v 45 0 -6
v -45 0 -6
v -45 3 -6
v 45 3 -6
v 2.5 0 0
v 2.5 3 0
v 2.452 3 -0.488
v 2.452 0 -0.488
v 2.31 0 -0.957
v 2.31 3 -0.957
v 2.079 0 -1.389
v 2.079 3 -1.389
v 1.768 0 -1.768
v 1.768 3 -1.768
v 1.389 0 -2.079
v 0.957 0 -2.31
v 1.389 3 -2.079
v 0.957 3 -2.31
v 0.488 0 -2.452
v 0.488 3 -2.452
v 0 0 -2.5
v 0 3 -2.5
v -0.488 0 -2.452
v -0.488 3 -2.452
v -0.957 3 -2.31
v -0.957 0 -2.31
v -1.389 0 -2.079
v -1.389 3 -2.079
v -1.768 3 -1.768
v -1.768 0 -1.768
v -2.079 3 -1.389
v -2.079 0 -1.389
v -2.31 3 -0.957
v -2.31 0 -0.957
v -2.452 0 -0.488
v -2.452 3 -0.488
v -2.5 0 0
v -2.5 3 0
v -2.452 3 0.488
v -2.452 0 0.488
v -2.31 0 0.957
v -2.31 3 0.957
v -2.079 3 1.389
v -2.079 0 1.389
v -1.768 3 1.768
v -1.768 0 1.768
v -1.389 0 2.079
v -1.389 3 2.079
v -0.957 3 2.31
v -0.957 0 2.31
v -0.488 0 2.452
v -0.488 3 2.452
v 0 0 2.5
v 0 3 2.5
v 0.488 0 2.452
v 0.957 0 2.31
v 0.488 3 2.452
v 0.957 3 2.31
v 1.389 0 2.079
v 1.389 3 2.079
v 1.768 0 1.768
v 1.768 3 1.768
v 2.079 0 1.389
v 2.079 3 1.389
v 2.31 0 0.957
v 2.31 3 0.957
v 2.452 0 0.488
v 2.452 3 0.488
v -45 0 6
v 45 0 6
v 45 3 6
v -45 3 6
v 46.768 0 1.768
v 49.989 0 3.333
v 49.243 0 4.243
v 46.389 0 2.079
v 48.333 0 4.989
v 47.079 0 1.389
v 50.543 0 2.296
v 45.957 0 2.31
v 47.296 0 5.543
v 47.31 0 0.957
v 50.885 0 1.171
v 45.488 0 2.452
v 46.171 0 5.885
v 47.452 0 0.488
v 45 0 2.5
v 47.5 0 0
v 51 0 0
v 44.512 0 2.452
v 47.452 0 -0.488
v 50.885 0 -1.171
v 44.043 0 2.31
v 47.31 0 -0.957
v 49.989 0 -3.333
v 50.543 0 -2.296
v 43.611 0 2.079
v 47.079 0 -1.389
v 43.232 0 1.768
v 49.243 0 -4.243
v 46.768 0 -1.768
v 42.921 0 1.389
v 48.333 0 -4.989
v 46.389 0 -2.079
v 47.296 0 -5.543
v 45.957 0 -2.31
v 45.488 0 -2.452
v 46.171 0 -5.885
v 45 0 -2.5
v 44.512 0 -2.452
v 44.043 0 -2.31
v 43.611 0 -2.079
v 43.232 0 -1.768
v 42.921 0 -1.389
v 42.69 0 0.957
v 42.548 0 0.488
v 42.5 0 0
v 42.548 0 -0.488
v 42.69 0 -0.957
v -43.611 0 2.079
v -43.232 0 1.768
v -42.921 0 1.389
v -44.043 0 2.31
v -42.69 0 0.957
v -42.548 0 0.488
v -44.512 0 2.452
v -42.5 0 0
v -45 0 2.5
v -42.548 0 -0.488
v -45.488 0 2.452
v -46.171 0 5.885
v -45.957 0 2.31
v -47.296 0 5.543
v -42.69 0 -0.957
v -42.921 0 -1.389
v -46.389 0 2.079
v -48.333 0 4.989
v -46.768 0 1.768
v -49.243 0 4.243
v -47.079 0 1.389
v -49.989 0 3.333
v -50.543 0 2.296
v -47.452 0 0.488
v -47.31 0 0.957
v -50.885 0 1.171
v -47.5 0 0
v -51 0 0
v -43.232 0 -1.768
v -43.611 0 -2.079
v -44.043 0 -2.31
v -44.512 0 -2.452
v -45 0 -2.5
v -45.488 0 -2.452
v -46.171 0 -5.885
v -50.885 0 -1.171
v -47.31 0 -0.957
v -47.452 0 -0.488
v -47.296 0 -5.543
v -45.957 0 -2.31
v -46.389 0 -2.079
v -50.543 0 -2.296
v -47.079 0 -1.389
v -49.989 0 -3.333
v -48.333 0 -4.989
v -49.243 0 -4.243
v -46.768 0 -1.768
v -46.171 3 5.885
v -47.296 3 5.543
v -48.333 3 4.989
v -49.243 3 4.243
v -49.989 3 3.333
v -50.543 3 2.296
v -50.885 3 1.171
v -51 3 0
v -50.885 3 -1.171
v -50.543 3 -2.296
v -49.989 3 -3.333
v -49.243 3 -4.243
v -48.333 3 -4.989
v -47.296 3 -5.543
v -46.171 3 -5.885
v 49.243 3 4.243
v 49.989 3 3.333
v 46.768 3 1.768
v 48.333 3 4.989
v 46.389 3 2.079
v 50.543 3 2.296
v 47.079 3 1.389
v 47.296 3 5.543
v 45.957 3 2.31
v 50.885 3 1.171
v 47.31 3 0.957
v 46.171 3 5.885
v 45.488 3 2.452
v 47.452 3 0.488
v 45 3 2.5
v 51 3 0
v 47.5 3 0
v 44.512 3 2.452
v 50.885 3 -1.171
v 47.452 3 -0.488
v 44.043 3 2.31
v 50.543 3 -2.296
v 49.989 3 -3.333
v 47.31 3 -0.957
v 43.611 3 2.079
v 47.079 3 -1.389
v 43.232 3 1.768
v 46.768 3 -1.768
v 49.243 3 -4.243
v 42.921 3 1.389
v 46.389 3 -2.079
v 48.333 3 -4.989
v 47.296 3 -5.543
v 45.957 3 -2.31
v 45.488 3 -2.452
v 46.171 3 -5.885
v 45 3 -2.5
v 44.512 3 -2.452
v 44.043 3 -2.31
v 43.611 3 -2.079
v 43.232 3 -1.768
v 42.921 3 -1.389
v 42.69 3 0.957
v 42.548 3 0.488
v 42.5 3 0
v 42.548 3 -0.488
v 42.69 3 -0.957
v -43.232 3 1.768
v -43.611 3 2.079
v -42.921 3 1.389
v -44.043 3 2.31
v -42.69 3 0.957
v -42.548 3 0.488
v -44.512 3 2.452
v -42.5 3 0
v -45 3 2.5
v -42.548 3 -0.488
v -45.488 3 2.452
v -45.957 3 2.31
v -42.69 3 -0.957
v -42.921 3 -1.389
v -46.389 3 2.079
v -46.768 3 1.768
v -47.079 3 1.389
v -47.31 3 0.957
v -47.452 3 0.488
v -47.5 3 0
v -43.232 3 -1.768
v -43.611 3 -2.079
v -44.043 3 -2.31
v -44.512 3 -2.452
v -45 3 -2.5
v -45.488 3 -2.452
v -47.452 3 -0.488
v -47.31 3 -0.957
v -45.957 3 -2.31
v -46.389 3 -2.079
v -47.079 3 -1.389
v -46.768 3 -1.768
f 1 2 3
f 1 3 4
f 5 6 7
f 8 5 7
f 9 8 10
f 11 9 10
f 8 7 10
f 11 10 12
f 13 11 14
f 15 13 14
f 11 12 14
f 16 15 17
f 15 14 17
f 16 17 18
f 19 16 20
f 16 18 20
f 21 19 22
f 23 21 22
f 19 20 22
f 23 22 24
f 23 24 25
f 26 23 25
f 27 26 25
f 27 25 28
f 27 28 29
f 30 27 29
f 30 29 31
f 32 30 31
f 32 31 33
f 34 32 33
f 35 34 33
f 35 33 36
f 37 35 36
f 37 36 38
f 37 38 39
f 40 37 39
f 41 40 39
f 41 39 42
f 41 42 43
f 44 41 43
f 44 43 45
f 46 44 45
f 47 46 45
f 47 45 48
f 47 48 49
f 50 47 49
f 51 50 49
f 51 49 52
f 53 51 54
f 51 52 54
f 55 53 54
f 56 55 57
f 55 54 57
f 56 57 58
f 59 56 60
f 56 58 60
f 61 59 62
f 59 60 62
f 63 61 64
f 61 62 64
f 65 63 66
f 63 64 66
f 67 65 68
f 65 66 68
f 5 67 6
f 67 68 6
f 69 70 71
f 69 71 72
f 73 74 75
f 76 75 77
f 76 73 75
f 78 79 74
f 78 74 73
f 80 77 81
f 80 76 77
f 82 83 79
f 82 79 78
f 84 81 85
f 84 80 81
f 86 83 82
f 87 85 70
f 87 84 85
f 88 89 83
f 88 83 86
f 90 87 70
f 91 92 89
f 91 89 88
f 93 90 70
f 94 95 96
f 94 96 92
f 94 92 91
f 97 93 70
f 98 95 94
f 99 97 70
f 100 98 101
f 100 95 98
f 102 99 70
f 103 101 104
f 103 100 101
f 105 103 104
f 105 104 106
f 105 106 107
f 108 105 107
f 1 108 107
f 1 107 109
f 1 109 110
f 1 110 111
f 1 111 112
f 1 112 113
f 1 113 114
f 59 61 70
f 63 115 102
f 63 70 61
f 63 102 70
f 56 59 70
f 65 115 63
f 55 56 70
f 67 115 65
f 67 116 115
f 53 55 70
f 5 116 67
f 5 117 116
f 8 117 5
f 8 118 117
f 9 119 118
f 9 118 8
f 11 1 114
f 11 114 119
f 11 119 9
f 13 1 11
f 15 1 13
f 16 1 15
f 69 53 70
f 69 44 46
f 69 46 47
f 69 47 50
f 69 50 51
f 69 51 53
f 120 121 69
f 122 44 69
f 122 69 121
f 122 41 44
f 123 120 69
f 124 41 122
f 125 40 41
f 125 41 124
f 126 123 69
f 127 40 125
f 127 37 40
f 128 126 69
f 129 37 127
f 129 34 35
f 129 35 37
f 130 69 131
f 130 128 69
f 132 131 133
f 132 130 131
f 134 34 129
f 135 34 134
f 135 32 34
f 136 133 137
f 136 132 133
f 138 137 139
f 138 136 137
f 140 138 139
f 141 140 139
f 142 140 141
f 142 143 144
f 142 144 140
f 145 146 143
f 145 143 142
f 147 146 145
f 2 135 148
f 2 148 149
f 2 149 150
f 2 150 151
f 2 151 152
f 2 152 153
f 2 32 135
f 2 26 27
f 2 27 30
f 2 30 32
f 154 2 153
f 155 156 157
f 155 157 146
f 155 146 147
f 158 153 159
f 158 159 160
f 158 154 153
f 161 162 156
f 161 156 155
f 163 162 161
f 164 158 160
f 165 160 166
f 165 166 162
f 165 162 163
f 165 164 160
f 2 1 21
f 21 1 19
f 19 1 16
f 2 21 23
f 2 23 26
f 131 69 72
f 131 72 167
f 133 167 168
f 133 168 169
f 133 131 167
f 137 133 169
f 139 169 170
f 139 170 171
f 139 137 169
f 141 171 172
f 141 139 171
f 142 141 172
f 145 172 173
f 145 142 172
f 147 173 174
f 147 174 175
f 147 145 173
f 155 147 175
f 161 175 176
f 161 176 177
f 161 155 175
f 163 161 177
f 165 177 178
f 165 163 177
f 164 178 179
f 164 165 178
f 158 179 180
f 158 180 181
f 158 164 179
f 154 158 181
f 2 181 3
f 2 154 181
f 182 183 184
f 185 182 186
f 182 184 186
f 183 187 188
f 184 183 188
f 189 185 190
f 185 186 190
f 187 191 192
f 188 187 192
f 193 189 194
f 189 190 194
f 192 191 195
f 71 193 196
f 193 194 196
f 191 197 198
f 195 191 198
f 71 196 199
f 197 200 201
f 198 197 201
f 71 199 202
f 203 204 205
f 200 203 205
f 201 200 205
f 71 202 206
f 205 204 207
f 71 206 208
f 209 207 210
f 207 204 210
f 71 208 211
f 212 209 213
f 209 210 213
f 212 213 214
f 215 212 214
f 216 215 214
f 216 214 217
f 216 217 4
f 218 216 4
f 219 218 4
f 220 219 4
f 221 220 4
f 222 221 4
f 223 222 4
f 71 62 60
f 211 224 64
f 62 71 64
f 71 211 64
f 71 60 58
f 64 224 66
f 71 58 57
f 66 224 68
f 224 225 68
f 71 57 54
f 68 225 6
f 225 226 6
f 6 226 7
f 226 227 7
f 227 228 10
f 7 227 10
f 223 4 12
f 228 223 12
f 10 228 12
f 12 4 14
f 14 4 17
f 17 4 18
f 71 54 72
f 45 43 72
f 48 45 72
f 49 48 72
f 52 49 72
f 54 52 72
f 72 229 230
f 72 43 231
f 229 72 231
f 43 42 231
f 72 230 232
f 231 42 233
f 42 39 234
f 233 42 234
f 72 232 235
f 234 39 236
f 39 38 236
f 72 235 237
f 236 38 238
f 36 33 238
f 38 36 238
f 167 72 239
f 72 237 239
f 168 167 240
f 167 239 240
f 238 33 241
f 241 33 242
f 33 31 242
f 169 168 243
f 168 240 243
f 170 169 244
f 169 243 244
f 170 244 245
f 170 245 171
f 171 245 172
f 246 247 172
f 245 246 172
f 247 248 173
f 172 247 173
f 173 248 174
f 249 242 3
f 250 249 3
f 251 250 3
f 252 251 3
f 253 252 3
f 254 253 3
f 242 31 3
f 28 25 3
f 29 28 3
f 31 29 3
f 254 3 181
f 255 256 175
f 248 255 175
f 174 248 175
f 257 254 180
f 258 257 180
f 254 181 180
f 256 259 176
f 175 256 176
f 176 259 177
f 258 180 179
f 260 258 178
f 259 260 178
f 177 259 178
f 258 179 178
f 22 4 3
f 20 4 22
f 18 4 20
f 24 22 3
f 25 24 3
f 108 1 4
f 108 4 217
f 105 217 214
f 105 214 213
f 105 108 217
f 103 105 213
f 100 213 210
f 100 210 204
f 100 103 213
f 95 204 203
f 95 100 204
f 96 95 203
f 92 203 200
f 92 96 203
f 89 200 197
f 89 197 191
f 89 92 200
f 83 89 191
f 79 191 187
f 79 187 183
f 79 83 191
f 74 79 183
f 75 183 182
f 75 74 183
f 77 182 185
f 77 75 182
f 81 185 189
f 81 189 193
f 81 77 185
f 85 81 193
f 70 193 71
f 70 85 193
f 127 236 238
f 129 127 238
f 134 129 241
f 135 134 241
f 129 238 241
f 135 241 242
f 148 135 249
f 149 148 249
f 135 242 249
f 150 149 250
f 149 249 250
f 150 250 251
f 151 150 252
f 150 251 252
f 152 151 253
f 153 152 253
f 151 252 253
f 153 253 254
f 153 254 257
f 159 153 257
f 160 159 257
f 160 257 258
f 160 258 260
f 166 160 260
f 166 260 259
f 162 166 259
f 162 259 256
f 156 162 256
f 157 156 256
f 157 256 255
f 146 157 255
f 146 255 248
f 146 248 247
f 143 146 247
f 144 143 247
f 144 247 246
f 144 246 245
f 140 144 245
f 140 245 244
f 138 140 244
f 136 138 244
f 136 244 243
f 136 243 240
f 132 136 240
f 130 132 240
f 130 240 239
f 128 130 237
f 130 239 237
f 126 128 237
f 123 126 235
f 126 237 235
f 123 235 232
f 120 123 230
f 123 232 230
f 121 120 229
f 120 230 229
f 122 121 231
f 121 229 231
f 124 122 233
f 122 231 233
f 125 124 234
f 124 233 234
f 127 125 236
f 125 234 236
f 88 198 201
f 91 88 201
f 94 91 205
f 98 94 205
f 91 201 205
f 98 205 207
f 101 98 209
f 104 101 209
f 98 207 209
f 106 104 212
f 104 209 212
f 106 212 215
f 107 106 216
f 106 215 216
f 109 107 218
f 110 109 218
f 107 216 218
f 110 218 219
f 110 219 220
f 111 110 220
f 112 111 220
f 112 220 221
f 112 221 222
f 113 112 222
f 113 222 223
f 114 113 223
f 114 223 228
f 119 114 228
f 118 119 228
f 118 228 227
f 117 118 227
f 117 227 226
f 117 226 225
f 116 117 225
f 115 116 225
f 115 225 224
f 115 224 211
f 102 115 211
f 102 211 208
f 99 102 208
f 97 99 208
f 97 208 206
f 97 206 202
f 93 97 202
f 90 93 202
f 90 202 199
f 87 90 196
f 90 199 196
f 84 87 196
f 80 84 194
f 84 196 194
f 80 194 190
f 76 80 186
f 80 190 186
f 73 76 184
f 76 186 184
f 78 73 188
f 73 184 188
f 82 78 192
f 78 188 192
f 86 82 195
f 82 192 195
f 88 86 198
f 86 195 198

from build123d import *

# Parameters (mm, degrees)
EXTRUDE_1_DEPTH     = 3
CUT_EXTRUDE_1_REACH = 5
SKETCH_2_R          = 2.5


with BuildPart() as part:
    # 草圖1 → 填料-伸長1 (new body)
    with BuildSketch(Plane(origin=(0, 0, 0), x_dir=(1, 0, 0), z_dir=(0, 1, 0))):
        with BuildLine():
            Line((-45, 6), (45, 6))
            ThreePointArc((45, 6), (51, 0), (45, -6))
            Line((45, -6), (-45, -6))
            ThreePointArc((-45, -6), (-51, 0), (-45, 6))
        make_face()
    extrude(amount=EXTRUDE_1_DEPTH)

    # 草圖2 → 除料-伸長1 (cut, up to next)
    with BuildSketch(Plane(origin=(0, 3, 0), x_dir=(1, 0, 0), z_dir=(0, 1, 0)), mode=Mode.PRIVATE) as cut_extrude_1_sk1:
        with Locations((-45, 0)):
            Circle(SKETCH_2_R)
    cut_extrude_1_tool1 = extrude(cut_extrude_1_sk1.sketch, amount=-CUT_EXTRUDE_1_REACH, mode=Mode.PRIVATE) & part.part
    add(cut_extrude_1_tool1.solids().sort_by_distance((-45, 3, 0))[0], mode=Mode.SUBTRACT)
    # 草圖2 → 除料-伸長1 (cut, up to next)
    with BuildSketch(Plane(origin=(0, 3, 0), x_dir=(1, 0, 0), z_dir=(0, 1, 0)), mode=Mode.PRIVATE) as cut_extrude_1_sk2:
        with Locations((45, 0)):
            Circle(SKETCH_2_R)
    cut_extrude_1_tool2 = extrude(cut_extrude_1_sk2.sketch, amount=-CUT_EXTRUDE_1_REACH, mode=Mode.PRIVATE) & part.part
    add(cut_extrude_1_tool2.solids().sort_by_distance((45, 3, 0))[0], mode=Mode.SUBTRACT)
    # 草圖2 → 除料-伸長1 (cut, up to next)
    with BuildSketch(Plane(origin=(0, 3, 0), x_dir=(1, 0, 0), z_dir=(0, 1, 0)), mode=Mode.PRIVATE) as cut_extrude_1_sk3:
        Circle(SKETCH_2_R)
    cut_extrude_1_tool3 = extrude(cut_extrude_1_sk3.sketch, amount=-CUT_EXTRUDE_1_REACH, mode=Mode.PRIVATE) & part.part
    add(cut_extrude_1_tool3.solids().sort_by_distance((0, 3, 0))[0], mode=Mode.SUBTRACT)


solid = part.part
